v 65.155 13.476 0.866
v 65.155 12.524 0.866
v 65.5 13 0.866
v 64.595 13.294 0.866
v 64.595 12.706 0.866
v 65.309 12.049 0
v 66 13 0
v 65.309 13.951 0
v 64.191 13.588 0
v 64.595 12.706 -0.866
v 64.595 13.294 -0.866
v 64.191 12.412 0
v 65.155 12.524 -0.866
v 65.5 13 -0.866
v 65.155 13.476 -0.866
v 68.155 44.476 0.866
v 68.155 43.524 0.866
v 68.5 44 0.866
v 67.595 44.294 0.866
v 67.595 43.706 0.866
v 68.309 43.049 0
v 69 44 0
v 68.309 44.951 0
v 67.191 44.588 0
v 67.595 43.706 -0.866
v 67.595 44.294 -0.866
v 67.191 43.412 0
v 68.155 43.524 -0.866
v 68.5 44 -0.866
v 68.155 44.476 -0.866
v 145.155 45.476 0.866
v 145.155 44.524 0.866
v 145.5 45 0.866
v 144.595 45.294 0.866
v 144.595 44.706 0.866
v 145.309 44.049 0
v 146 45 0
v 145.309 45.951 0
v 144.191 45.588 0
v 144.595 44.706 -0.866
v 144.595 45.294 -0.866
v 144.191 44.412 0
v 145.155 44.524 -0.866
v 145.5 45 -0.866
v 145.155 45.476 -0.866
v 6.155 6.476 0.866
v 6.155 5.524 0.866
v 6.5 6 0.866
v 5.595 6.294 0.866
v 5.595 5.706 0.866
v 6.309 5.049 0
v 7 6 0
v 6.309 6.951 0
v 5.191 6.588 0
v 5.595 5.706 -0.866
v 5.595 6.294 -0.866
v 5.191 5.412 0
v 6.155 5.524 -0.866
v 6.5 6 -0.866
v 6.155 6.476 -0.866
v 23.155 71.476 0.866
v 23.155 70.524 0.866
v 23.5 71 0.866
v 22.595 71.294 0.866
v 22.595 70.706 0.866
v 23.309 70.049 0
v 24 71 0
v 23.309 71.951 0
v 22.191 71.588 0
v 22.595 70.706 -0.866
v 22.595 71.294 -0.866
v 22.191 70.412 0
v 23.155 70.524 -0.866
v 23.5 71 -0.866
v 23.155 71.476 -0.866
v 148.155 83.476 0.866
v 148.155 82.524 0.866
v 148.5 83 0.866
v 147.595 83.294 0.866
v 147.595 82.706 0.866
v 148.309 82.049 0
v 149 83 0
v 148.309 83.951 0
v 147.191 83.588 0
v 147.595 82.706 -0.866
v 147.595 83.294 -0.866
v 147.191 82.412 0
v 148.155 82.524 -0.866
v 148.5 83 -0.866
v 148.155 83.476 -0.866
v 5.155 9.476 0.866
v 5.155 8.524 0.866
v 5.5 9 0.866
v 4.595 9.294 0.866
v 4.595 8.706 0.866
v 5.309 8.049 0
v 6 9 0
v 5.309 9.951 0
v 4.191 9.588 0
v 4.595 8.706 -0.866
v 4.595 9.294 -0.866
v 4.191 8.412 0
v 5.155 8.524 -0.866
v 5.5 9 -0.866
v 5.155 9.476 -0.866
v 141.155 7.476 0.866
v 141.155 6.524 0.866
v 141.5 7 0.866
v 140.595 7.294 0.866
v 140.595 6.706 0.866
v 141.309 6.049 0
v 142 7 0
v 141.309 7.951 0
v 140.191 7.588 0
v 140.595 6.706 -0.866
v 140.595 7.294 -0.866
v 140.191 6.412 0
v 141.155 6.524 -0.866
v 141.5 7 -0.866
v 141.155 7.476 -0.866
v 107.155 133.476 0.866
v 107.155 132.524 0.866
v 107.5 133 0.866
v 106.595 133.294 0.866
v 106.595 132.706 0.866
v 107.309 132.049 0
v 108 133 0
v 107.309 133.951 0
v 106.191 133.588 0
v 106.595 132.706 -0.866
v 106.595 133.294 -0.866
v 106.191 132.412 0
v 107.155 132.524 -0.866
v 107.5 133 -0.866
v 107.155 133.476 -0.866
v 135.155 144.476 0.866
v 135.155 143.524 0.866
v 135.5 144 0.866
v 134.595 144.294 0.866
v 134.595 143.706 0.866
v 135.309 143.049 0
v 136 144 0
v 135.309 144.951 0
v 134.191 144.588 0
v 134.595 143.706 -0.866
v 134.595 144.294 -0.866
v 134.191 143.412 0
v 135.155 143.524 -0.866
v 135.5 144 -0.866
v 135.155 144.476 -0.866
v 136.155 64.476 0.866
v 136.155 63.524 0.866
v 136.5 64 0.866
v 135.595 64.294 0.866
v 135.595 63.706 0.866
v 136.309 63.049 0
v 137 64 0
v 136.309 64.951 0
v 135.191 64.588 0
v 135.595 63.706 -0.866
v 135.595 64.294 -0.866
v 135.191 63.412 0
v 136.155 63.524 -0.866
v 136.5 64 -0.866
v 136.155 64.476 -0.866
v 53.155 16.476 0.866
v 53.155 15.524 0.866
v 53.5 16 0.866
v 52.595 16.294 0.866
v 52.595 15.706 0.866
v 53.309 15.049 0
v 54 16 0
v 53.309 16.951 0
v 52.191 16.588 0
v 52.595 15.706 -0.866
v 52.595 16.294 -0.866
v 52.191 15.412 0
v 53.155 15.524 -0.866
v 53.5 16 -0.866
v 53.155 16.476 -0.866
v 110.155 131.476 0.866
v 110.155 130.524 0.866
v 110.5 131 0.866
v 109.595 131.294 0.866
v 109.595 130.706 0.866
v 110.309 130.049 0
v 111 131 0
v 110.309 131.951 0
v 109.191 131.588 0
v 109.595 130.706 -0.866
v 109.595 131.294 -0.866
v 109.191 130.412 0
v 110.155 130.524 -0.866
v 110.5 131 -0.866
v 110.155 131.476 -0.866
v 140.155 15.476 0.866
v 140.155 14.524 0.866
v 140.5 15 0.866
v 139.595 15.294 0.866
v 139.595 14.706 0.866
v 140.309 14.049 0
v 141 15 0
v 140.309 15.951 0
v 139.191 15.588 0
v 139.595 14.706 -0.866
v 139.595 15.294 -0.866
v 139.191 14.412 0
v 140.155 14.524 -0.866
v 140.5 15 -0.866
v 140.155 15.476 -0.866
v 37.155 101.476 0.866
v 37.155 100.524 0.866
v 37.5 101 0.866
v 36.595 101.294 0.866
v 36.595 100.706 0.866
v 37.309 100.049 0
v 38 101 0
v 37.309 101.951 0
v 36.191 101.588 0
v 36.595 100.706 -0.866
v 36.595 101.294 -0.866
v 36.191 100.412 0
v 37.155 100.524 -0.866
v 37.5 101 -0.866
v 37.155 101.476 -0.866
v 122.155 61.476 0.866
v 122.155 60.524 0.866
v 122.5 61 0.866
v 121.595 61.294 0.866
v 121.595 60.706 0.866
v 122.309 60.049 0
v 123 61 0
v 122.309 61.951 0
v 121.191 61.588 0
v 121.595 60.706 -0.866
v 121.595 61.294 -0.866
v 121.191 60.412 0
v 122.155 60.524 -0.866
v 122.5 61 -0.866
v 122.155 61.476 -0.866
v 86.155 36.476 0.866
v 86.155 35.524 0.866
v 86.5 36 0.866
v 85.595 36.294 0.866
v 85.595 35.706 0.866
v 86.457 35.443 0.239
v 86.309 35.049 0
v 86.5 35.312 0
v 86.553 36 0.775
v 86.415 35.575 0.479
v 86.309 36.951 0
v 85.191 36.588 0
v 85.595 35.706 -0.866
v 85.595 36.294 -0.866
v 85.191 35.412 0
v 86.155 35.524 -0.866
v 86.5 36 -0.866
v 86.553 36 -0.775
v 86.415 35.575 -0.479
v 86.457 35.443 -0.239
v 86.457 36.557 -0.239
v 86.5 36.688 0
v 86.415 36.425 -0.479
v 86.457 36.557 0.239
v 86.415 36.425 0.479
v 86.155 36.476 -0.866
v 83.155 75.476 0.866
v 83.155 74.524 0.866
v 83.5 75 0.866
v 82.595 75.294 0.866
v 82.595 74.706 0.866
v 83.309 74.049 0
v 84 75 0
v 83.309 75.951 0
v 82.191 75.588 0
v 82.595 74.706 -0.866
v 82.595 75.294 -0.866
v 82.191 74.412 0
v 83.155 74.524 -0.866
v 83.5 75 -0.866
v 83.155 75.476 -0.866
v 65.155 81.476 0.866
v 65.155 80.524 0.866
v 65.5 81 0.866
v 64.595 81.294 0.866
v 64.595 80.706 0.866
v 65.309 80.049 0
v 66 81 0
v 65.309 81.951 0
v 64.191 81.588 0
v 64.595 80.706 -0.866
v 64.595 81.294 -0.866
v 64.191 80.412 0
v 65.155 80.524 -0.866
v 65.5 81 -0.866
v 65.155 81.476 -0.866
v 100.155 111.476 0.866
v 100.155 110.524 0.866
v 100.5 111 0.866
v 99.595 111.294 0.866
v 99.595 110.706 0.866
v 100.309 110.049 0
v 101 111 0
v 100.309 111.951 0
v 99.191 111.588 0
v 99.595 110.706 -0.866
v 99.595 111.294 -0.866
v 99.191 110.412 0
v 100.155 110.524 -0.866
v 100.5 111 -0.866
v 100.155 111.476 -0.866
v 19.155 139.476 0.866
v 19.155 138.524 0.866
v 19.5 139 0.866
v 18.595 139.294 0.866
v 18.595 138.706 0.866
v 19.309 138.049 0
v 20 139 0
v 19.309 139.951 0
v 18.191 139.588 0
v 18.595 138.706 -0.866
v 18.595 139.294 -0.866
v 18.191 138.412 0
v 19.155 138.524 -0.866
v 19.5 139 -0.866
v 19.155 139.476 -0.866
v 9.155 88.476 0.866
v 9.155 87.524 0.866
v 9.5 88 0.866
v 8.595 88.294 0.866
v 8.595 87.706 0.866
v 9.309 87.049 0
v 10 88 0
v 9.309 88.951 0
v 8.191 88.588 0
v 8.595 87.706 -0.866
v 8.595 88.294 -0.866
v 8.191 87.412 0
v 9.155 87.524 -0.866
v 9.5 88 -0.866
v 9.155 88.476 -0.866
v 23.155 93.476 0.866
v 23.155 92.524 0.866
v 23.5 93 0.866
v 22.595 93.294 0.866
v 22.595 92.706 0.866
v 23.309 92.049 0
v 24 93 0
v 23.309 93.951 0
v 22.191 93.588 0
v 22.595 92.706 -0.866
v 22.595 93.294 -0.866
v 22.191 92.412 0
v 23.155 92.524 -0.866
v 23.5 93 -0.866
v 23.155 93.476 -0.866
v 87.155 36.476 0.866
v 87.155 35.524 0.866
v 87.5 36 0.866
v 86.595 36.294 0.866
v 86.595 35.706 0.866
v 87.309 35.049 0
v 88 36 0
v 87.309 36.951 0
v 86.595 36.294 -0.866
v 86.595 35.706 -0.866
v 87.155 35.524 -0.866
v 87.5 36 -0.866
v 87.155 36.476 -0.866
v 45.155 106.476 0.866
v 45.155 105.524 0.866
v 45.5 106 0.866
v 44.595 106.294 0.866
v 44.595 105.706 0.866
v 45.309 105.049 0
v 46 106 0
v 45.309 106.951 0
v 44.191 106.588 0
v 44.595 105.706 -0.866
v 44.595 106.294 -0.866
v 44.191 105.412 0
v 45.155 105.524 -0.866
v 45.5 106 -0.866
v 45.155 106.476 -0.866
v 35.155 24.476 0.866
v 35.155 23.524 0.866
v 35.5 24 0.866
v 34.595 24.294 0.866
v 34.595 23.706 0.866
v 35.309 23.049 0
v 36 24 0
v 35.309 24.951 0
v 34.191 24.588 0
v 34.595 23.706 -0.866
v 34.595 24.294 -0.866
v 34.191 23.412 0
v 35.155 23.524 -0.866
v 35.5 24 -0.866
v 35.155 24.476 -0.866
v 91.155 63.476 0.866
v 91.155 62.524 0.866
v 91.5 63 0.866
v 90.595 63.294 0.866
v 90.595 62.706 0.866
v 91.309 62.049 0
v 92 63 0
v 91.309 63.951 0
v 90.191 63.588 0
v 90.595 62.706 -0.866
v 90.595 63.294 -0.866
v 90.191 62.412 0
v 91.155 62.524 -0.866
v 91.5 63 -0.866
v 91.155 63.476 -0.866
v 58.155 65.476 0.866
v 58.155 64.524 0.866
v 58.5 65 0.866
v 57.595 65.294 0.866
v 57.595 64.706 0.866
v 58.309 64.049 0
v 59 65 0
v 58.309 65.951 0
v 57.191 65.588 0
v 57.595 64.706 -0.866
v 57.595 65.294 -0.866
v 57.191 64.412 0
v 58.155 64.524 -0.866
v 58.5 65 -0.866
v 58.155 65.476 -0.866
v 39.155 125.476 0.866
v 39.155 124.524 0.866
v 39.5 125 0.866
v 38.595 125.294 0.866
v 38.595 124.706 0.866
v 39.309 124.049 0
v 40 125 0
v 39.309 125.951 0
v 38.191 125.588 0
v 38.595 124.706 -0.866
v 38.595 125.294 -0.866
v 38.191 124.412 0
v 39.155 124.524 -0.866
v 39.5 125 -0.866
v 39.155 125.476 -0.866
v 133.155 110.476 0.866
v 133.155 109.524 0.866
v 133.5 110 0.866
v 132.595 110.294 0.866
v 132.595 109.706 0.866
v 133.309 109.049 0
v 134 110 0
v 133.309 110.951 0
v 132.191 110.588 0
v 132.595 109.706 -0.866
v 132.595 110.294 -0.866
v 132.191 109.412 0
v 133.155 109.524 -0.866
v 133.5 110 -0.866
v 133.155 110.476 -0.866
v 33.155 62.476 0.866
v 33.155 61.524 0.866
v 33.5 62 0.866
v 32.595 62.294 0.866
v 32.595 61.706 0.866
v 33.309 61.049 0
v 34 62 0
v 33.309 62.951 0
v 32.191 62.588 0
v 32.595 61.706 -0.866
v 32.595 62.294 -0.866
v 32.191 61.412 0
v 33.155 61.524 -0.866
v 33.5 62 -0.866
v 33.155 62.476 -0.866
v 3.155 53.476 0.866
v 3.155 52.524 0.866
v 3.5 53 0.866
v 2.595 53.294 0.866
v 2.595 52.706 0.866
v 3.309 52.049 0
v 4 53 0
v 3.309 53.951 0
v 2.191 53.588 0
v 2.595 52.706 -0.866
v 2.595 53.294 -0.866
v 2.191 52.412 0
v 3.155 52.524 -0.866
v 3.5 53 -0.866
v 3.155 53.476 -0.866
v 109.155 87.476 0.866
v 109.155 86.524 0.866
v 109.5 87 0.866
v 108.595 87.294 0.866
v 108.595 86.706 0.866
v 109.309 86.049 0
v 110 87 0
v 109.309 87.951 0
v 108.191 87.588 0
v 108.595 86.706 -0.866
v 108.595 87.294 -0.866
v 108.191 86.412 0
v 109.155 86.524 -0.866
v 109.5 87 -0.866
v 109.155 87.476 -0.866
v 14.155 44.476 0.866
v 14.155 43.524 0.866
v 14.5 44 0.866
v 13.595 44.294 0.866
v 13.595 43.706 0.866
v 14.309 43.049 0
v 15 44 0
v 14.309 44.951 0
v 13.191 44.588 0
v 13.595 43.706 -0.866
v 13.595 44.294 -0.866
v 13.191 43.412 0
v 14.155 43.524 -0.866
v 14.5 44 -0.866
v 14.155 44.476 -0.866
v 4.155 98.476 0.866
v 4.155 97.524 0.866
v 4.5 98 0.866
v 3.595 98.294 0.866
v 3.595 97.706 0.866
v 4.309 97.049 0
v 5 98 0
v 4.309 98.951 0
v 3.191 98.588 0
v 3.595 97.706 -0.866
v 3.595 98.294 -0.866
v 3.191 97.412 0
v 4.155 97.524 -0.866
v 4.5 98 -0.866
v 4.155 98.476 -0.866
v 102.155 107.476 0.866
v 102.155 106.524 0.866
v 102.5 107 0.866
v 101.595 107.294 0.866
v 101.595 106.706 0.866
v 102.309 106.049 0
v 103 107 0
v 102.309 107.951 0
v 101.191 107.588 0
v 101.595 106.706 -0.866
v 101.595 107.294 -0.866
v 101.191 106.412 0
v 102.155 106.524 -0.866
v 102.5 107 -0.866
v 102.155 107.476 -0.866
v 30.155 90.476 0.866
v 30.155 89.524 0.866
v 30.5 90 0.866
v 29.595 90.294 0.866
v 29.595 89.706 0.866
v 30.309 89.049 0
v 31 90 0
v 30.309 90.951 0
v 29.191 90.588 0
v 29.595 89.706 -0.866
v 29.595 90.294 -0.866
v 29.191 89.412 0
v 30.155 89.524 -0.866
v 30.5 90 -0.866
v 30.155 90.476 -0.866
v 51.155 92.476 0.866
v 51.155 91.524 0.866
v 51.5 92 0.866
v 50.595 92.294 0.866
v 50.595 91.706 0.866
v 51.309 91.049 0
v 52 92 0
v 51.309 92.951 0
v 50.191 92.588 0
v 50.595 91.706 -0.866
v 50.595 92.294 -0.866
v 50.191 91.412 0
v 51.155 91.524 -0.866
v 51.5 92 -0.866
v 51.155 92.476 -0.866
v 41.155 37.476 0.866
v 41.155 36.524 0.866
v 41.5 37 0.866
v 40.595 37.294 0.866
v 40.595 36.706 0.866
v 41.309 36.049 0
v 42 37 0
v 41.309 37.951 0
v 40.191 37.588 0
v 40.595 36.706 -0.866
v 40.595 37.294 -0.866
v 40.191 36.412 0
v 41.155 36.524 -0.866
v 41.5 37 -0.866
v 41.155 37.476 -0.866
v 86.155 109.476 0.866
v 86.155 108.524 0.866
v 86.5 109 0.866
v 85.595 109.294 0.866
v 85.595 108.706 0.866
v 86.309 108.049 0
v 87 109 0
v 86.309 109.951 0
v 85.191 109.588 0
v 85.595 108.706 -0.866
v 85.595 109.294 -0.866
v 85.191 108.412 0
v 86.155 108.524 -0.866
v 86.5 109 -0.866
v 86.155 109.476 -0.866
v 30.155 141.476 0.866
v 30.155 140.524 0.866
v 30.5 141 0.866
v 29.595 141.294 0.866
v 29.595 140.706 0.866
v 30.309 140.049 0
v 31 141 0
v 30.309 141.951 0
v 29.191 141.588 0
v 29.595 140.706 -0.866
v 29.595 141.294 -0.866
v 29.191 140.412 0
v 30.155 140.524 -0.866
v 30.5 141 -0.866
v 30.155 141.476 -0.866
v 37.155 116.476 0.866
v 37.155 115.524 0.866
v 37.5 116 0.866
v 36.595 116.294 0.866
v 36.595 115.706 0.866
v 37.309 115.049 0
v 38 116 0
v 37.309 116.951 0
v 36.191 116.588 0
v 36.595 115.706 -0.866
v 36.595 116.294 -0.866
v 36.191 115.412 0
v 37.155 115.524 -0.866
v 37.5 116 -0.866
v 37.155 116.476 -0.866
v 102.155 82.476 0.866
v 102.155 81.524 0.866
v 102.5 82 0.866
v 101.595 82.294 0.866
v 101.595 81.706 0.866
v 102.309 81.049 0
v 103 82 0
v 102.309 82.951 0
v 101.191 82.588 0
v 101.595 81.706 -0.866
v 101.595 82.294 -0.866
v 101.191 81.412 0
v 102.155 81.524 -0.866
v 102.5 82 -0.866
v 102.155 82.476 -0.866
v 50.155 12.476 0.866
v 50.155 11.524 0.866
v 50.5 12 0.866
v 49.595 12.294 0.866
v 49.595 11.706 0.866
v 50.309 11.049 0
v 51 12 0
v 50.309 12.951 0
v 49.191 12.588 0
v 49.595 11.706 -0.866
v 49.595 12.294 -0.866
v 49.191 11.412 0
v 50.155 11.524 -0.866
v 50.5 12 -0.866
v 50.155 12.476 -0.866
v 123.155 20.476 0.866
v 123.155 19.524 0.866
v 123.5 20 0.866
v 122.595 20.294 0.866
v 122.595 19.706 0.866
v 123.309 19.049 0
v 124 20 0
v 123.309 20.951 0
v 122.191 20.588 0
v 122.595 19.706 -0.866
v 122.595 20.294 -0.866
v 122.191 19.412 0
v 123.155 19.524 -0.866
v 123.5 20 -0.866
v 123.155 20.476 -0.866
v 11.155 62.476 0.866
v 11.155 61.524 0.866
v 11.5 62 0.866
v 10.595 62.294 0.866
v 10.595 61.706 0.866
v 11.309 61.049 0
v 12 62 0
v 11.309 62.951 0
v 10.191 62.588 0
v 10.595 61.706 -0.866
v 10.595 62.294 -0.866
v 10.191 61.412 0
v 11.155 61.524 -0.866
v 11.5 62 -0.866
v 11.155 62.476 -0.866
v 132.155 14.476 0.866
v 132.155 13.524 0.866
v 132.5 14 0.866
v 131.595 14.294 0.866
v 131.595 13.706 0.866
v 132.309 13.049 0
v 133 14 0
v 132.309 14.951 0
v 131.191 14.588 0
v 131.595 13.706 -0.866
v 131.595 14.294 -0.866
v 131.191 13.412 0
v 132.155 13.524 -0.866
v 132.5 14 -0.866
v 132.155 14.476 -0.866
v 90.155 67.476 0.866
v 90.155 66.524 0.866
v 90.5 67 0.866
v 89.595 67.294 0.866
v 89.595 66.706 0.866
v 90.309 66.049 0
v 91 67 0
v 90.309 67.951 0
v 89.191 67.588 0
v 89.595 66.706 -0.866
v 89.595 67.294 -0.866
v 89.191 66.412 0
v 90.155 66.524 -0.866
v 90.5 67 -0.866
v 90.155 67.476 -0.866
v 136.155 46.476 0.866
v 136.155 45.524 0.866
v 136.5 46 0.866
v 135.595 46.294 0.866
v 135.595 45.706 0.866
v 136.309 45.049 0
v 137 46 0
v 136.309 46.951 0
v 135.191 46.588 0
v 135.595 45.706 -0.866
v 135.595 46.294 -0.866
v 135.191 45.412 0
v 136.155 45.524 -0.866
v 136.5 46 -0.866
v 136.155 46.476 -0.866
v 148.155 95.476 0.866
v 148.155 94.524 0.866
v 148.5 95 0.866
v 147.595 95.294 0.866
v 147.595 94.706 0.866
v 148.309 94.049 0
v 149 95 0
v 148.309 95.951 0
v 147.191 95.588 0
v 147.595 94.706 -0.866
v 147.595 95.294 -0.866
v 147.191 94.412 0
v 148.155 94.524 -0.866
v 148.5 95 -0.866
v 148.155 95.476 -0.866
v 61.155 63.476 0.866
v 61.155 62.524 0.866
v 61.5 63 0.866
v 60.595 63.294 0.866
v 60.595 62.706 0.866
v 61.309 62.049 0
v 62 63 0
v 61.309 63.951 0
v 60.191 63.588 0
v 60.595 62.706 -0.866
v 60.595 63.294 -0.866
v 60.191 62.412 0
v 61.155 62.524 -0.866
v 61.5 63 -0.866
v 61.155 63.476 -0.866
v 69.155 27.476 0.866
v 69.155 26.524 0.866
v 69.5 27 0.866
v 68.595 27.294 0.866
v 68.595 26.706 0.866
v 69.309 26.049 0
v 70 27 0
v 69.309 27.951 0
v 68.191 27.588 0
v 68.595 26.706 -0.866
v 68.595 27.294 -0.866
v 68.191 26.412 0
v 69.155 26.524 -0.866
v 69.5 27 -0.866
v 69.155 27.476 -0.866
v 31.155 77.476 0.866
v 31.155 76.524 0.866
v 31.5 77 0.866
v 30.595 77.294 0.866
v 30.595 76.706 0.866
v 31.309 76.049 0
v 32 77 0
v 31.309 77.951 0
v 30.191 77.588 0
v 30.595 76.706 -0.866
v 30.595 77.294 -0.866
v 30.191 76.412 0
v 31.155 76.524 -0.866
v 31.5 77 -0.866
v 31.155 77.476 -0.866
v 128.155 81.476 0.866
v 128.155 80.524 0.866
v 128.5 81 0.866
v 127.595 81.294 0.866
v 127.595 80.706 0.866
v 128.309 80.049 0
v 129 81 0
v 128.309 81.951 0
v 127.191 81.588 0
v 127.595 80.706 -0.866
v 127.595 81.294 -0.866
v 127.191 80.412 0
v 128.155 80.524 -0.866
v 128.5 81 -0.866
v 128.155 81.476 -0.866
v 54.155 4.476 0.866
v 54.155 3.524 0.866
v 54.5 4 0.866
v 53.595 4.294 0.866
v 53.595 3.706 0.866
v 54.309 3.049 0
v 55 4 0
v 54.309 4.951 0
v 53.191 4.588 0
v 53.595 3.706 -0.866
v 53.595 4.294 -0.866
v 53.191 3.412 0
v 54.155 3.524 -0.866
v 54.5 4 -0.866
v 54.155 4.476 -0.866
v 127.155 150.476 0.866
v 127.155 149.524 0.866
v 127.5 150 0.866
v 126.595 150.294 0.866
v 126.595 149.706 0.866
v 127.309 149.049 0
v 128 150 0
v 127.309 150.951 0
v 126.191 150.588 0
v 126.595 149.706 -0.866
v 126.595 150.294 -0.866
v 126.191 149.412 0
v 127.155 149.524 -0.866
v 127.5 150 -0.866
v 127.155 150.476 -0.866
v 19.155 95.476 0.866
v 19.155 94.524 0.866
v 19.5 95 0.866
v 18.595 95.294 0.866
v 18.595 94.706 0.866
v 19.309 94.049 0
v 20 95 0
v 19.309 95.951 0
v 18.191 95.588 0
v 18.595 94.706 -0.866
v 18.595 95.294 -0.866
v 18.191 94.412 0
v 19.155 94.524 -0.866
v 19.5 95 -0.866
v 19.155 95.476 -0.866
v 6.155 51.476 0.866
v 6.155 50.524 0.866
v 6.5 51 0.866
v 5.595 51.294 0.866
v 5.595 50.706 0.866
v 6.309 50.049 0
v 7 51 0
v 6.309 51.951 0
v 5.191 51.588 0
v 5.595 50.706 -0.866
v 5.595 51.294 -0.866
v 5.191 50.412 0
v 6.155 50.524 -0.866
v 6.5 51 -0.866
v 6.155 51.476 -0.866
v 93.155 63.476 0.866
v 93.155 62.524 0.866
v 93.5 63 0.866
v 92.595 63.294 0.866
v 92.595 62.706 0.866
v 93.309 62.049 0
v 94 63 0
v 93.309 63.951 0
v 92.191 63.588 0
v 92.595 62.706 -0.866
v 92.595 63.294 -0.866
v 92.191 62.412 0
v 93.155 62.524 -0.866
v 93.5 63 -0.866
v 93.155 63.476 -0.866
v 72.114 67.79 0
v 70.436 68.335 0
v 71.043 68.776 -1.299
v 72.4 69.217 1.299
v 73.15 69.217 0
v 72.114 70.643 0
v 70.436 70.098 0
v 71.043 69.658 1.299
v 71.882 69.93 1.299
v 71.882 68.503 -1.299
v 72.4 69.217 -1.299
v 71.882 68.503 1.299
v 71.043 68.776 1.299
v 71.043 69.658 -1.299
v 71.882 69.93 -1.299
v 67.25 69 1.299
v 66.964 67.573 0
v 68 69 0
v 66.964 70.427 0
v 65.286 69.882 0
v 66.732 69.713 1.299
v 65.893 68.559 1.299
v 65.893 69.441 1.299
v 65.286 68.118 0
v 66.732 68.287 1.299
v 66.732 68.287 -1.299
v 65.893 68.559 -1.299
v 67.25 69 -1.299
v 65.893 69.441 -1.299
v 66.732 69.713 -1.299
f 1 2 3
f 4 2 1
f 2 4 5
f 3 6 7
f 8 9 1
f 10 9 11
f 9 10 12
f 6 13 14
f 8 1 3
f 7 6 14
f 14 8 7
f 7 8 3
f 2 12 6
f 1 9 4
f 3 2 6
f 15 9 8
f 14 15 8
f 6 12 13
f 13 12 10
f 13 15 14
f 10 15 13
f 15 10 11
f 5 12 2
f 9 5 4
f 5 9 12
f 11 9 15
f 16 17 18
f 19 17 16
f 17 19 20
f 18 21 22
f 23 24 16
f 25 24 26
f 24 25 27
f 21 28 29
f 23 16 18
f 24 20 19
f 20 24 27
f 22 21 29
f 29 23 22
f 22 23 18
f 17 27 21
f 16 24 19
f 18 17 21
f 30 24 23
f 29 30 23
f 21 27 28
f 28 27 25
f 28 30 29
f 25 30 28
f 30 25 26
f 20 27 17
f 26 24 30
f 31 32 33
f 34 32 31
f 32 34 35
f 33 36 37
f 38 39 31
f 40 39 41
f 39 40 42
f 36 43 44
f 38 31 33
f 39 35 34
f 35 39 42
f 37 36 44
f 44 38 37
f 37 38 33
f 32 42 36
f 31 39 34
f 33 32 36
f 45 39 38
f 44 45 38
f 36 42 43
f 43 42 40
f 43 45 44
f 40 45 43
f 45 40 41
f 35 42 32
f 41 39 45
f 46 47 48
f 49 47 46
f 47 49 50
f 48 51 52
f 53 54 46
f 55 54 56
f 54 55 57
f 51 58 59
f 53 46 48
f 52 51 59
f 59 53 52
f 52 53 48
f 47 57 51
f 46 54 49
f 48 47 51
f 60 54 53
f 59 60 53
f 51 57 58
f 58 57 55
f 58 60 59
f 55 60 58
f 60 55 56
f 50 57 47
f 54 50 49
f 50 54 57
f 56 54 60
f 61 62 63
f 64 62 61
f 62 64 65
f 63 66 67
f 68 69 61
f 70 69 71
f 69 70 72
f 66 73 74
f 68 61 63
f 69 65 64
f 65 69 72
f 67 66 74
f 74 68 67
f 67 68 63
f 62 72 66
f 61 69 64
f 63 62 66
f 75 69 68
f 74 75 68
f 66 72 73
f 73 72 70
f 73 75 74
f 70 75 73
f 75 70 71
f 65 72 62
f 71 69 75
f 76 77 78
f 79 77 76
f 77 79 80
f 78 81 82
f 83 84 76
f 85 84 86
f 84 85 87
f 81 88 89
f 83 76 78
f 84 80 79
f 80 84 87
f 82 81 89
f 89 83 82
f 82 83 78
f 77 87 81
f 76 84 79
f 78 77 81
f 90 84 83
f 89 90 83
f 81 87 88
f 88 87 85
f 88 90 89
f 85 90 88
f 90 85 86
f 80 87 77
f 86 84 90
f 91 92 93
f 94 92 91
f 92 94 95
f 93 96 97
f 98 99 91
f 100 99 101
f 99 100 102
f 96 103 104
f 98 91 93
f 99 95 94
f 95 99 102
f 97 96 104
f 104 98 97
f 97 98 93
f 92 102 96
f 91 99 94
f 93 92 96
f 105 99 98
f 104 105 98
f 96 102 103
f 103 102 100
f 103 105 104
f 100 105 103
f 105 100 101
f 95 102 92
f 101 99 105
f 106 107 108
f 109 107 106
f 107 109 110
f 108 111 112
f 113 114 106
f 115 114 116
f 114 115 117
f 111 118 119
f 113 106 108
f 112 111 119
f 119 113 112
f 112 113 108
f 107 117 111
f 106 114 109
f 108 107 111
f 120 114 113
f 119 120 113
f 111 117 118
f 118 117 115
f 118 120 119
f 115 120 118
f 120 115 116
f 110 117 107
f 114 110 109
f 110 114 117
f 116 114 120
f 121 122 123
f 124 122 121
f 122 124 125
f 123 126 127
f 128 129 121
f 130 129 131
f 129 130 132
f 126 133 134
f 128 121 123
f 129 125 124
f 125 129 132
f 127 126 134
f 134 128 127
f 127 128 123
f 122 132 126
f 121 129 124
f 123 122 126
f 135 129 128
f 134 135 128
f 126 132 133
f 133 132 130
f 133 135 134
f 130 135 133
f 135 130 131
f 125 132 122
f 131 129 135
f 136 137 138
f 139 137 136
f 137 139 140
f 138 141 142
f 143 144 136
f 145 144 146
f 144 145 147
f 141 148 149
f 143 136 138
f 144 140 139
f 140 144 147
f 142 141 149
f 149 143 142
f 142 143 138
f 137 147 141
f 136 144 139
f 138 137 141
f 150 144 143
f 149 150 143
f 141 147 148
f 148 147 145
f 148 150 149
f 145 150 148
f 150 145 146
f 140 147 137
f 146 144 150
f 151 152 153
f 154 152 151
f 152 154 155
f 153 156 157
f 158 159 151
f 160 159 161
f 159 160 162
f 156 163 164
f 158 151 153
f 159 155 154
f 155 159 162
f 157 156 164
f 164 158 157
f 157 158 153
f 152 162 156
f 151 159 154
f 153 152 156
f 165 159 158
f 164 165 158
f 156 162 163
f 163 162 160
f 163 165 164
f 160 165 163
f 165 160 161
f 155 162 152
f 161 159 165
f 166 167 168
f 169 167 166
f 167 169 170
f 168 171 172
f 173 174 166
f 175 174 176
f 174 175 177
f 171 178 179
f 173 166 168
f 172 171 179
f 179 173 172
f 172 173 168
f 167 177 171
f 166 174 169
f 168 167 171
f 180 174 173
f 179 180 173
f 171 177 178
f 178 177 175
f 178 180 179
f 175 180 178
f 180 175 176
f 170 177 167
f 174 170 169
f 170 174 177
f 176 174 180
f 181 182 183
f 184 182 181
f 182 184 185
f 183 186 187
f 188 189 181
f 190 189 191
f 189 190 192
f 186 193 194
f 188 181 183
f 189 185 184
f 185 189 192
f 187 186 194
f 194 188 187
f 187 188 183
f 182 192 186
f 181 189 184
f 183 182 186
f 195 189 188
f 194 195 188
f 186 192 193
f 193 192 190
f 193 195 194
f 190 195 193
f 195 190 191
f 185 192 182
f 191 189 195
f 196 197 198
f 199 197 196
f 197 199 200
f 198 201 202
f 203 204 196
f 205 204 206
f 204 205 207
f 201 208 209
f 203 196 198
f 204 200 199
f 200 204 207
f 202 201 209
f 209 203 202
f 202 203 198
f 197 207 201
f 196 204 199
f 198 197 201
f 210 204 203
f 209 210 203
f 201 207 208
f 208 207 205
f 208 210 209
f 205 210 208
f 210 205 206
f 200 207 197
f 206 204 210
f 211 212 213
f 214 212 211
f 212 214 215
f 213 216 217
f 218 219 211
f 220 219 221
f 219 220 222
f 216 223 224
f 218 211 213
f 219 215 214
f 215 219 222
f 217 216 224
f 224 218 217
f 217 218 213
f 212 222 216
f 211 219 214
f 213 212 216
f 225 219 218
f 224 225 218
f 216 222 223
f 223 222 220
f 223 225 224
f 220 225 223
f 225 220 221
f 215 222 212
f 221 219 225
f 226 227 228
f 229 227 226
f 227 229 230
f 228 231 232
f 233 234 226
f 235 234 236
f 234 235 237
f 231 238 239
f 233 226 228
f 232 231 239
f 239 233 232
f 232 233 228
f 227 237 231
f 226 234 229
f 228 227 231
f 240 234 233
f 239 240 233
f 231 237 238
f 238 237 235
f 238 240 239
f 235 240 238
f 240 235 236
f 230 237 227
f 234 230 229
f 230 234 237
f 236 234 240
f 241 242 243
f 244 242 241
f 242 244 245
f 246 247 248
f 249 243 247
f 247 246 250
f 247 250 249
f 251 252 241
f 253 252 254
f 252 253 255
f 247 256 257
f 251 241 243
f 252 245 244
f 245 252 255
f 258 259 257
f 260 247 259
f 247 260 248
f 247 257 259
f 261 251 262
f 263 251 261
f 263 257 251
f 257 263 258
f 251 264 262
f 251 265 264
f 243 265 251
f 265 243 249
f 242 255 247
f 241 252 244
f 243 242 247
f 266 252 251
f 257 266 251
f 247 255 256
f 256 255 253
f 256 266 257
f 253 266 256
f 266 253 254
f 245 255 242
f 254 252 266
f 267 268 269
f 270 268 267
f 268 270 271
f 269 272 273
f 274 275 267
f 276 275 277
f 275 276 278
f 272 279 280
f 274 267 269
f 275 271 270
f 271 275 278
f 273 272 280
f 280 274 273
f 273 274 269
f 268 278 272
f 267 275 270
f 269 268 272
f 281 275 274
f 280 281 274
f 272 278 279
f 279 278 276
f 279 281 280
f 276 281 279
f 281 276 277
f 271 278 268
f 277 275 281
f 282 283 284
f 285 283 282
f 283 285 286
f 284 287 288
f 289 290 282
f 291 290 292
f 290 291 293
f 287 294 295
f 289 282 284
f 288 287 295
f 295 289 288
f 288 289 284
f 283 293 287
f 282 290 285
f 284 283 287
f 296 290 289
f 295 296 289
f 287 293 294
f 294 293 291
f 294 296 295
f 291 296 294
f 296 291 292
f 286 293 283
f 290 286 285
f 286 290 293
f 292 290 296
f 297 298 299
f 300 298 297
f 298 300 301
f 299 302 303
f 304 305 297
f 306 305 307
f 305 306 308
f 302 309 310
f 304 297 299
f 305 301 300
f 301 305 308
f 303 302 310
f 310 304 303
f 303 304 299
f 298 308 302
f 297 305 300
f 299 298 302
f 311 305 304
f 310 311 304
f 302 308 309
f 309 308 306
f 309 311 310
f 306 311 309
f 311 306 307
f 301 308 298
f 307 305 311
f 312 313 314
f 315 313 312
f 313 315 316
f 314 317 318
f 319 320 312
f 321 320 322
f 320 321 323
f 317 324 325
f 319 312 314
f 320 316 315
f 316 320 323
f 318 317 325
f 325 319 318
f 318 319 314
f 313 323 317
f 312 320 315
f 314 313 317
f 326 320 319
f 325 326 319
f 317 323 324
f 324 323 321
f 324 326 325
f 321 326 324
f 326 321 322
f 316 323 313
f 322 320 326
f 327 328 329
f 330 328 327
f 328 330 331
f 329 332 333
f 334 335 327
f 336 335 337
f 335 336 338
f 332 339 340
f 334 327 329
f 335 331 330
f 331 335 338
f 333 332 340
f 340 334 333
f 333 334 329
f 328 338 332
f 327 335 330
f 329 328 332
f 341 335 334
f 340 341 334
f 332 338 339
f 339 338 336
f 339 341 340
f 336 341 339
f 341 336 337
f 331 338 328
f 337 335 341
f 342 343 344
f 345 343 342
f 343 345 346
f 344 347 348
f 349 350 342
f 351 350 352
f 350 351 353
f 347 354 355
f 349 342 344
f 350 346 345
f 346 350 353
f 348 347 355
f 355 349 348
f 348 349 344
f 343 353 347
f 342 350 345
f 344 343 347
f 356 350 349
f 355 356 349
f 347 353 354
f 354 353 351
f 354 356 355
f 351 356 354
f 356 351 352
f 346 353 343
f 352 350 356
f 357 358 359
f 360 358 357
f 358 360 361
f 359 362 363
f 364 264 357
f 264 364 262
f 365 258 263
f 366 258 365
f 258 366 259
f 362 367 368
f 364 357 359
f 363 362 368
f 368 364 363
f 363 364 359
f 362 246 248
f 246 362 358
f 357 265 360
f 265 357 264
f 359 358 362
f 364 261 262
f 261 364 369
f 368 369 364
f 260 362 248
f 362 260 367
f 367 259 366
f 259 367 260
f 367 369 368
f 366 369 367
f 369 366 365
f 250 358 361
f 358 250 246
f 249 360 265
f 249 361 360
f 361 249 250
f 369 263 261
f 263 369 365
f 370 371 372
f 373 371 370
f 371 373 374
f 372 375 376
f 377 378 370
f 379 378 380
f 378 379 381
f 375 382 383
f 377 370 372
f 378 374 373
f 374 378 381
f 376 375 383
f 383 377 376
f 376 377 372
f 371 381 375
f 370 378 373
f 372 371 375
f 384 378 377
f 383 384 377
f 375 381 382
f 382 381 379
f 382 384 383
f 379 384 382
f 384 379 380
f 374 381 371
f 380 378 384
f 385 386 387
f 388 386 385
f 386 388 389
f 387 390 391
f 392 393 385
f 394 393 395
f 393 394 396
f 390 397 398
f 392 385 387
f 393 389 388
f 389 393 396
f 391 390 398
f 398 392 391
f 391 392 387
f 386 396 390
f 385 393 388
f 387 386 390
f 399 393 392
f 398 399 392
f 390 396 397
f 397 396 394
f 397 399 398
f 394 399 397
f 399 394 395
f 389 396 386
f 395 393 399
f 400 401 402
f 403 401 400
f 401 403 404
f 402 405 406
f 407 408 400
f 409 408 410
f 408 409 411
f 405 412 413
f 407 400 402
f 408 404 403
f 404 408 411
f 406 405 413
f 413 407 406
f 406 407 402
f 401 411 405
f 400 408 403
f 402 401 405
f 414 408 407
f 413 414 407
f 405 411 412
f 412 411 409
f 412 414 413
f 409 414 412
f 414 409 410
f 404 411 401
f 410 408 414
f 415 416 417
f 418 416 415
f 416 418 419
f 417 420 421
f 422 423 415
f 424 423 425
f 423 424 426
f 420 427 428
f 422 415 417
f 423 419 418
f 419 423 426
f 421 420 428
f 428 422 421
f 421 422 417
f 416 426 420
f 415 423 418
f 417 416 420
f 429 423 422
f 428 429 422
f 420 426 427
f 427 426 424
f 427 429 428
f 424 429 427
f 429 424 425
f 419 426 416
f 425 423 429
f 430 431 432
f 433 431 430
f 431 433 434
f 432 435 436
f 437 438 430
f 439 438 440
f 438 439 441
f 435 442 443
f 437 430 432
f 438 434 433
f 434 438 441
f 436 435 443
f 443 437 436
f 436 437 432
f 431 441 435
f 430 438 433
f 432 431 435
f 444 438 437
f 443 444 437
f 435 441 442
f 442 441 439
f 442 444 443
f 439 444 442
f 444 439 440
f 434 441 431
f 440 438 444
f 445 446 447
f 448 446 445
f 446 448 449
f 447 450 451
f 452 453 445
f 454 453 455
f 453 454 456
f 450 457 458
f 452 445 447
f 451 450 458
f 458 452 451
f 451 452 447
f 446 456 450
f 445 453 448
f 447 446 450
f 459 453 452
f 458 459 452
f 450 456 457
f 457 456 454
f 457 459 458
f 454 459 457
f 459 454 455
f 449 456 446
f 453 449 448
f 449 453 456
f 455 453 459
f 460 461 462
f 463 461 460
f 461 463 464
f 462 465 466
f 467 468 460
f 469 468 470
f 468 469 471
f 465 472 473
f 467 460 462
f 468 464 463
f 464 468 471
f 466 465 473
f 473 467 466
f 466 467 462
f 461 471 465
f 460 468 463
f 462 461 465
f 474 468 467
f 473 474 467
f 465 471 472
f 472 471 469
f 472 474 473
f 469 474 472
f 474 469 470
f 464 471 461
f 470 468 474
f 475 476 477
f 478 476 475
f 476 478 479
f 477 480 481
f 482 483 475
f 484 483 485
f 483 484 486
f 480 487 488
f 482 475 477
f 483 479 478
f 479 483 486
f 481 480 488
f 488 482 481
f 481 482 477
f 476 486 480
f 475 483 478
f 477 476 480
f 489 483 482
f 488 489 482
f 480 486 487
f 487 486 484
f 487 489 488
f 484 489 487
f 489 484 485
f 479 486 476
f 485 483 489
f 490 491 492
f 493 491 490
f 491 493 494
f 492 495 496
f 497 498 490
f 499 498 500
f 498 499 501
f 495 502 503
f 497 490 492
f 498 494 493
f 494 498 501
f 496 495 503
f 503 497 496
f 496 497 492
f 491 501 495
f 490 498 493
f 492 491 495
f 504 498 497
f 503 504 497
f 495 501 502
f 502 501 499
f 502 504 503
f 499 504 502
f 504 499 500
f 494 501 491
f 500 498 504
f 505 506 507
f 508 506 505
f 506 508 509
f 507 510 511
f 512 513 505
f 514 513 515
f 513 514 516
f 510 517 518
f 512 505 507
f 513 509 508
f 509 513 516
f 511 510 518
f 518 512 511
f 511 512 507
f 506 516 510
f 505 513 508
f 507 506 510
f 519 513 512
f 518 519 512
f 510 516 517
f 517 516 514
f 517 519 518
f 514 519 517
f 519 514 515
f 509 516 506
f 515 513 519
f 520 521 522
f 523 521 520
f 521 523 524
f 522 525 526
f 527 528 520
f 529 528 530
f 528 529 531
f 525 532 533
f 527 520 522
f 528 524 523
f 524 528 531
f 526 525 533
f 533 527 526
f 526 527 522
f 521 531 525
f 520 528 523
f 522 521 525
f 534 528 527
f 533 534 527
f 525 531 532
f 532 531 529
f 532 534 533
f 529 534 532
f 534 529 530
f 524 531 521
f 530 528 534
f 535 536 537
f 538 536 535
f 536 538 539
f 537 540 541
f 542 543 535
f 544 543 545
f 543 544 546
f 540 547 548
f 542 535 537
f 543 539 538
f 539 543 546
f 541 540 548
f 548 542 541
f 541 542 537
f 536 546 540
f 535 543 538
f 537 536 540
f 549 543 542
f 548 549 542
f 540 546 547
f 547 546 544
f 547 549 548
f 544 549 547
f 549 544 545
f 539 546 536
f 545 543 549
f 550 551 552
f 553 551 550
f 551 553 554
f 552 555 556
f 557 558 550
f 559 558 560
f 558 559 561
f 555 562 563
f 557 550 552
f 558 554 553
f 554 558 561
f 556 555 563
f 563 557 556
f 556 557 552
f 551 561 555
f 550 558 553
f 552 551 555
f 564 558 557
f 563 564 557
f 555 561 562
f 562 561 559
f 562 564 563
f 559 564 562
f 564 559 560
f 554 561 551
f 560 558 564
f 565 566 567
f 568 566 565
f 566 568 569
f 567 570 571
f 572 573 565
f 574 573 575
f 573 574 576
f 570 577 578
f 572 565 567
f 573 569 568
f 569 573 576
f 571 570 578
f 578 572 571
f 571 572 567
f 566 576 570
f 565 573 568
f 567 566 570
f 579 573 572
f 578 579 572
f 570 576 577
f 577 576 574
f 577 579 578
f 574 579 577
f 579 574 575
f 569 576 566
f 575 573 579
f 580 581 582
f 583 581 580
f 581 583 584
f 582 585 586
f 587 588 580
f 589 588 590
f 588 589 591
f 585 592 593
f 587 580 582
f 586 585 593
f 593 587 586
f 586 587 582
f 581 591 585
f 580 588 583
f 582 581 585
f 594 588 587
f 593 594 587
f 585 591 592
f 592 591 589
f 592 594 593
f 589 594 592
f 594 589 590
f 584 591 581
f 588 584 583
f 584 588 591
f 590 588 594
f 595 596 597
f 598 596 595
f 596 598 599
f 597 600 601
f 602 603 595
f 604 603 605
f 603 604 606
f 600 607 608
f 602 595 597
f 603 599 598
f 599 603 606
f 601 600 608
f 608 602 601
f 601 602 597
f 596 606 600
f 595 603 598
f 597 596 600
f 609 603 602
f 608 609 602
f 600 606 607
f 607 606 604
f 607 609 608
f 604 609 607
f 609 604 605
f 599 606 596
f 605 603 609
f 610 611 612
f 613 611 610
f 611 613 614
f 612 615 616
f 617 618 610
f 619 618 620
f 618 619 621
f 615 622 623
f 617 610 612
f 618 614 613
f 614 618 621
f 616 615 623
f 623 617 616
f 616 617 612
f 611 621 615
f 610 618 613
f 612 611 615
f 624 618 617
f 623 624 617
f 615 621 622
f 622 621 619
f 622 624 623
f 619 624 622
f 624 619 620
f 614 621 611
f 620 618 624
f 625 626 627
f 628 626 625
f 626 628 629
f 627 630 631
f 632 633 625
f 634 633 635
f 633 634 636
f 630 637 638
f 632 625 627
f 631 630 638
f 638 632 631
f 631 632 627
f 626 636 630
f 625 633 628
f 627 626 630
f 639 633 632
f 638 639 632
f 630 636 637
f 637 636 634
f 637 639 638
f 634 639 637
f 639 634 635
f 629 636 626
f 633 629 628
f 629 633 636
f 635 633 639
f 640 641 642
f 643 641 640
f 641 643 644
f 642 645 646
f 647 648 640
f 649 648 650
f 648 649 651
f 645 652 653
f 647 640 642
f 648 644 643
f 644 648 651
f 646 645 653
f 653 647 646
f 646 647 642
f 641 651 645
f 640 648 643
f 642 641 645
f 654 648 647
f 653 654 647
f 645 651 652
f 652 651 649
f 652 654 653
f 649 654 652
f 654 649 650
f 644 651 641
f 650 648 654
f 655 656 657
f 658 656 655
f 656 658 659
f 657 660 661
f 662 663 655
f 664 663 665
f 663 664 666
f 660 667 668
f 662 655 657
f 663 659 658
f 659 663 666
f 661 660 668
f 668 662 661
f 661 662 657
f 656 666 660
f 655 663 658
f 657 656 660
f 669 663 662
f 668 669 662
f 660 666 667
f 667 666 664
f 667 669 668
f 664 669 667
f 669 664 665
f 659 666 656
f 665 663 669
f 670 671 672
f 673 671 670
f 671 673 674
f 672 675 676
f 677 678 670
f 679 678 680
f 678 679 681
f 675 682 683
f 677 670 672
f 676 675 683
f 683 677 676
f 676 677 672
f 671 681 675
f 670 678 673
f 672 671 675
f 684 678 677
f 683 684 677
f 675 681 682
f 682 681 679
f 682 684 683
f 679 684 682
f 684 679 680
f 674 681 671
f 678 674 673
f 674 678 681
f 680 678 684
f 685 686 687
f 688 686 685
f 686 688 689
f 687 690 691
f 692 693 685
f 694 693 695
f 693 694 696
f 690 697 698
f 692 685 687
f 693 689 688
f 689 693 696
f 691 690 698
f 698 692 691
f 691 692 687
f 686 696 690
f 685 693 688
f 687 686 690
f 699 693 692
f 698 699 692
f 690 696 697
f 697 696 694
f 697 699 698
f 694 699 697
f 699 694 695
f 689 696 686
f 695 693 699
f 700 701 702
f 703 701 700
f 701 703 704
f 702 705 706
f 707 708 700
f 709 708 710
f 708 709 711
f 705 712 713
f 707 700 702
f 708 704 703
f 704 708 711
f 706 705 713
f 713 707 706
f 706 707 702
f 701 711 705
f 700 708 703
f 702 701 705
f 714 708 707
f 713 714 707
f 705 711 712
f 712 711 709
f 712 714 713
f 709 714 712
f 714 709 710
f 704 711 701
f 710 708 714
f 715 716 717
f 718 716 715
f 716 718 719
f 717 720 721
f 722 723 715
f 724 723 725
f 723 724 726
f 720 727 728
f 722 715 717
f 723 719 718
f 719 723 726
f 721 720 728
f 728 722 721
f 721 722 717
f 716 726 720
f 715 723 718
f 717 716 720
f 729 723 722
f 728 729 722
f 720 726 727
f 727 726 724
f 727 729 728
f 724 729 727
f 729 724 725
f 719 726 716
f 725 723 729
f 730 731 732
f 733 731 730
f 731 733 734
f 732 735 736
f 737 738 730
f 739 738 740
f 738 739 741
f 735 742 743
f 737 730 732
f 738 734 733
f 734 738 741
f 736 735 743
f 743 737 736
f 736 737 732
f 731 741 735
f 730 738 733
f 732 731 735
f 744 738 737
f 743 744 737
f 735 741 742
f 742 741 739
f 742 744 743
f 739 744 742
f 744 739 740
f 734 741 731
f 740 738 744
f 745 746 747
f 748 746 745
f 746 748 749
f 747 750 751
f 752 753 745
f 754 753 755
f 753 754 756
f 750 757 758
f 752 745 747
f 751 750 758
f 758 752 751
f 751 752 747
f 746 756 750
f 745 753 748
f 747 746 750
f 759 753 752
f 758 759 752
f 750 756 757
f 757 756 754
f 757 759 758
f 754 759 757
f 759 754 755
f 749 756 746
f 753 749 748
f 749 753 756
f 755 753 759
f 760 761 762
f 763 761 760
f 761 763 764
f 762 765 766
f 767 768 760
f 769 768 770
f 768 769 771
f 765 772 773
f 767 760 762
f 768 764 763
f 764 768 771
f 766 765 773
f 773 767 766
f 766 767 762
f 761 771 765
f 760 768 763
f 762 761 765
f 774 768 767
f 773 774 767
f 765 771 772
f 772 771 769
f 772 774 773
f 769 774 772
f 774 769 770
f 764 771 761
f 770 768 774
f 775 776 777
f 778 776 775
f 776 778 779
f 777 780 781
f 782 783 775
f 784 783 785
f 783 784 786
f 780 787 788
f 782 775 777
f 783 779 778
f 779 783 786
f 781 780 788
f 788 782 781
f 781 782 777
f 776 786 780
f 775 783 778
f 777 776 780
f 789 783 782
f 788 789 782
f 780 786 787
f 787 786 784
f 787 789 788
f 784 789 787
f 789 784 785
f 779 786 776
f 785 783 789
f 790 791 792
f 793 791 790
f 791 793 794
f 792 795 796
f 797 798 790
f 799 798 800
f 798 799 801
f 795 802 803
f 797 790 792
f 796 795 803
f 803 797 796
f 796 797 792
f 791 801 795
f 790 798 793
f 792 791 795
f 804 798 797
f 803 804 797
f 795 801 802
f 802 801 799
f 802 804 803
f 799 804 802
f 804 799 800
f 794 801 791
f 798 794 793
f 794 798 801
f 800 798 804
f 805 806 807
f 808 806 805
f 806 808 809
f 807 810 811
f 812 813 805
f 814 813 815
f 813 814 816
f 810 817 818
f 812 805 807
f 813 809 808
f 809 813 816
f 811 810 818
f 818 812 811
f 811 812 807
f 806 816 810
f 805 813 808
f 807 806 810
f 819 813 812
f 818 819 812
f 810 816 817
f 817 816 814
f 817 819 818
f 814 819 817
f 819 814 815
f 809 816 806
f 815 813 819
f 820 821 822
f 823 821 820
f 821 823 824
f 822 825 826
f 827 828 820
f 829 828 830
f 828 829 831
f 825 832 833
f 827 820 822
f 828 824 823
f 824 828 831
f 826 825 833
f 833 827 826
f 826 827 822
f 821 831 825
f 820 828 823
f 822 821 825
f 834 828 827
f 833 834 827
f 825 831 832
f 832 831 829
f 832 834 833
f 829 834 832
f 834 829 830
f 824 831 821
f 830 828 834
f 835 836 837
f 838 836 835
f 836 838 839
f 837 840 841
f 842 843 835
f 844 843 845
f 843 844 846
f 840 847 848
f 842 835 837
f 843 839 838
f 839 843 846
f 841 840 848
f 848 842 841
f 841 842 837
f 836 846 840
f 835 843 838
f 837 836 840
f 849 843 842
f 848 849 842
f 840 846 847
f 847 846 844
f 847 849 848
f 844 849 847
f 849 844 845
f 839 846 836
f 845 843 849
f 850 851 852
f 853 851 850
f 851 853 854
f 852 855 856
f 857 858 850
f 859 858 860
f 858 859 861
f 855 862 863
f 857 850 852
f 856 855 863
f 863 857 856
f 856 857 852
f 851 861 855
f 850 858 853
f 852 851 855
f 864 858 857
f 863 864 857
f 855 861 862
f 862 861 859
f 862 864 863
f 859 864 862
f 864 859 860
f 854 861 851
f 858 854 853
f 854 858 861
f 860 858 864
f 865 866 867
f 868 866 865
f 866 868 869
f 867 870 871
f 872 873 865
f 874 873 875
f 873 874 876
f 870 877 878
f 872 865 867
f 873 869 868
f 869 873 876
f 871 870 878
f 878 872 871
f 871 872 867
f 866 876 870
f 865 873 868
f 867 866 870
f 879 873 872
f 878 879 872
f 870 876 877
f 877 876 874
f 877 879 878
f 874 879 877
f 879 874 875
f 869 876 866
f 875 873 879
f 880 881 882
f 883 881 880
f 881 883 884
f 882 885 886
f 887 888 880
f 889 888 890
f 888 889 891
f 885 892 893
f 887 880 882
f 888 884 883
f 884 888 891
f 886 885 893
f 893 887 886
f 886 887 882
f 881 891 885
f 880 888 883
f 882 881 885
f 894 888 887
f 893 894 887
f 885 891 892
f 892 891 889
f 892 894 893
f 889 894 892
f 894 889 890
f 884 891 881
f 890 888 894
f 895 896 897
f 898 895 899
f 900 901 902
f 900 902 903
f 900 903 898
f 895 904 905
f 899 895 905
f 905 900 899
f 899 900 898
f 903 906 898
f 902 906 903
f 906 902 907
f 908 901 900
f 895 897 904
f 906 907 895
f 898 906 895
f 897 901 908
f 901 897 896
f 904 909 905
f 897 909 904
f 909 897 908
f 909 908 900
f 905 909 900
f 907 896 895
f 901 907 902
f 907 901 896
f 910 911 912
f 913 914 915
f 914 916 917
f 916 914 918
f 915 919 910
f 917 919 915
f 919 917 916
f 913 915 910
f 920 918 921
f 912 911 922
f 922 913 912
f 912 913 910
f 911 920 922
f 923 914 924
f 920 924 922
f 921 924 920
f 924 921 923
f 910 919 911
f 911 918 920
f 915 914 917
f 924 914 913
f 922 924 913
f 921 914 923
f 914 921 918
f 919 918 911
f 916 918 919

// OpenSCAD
//arithmetic mean

function rnd_v(init_value,end_value)=round(rands(init_value,end_value,1)[0]);      
      
function rnd_points(width,length,amount)=
     [for(i=[0:amount-1])
        [rnd_v(0,width),rnd_v(0,length)]];
     
array=rnd_points(150,150,60) ;
       
  
for(i=array)
     translate(i)
         sphere(1);

function sum(list)=
      let(leng=len(list))
      leng==1?list[0]:
      leng==2?list[0]+list[1]:
      let( 
          sum_first=list[0]+list[1],
          sum_after=[for(i=[2:leng-1])
              list[i]])    
      sum(concat(sum_first,sum_after));

function arithmetic_mean(array)=
     let(amount=len(array))
     let(x=[for(i=array)
          i.x
          ])
     let(y=[for(i=array)
          i.y
          ]) 
     [sum(x)/amount,sum(y)/amount];
     
//-------------------------------------------------------------------------------------------
function sort(list)=
     let(leng=len(list))
     leng<=1? list:
          let(
               pivot=list[0],
              
               before=[for(j=1;j<leng;j=j+1) 
               if(list[j]<pivot) 
                    list[j]],               
               after=[for(j=1;j<leng;j=j+1)
               if(list[j]>=pivot)
                    list[j]]       
               )               
     [each sort(before),pivot,each sort(after)];   
    
function midian(array)=
     let(array_x=sort([for(i=array)i.x]))
     let(array_y=sort([for(i=array)i.y]))
     let(amount=len(array_x))
     let(x=
     amount%2==0?
     (array_x[amount/2]+array_x[amount/2+1])/2:
     array_x[round(amount/2)])
     
     let(y=
     amount%2==0?
     (array_y[amount/2]+array_y[amount/2+1])/2:
     array_y[round(amount/2)])
     [x,y];



translate(arithmetic_mean(array)) 
     color("red")
     sphere(1.5);
 
 translate(midian(array))
     color("blue")
     sphere(1.5);
 
 
